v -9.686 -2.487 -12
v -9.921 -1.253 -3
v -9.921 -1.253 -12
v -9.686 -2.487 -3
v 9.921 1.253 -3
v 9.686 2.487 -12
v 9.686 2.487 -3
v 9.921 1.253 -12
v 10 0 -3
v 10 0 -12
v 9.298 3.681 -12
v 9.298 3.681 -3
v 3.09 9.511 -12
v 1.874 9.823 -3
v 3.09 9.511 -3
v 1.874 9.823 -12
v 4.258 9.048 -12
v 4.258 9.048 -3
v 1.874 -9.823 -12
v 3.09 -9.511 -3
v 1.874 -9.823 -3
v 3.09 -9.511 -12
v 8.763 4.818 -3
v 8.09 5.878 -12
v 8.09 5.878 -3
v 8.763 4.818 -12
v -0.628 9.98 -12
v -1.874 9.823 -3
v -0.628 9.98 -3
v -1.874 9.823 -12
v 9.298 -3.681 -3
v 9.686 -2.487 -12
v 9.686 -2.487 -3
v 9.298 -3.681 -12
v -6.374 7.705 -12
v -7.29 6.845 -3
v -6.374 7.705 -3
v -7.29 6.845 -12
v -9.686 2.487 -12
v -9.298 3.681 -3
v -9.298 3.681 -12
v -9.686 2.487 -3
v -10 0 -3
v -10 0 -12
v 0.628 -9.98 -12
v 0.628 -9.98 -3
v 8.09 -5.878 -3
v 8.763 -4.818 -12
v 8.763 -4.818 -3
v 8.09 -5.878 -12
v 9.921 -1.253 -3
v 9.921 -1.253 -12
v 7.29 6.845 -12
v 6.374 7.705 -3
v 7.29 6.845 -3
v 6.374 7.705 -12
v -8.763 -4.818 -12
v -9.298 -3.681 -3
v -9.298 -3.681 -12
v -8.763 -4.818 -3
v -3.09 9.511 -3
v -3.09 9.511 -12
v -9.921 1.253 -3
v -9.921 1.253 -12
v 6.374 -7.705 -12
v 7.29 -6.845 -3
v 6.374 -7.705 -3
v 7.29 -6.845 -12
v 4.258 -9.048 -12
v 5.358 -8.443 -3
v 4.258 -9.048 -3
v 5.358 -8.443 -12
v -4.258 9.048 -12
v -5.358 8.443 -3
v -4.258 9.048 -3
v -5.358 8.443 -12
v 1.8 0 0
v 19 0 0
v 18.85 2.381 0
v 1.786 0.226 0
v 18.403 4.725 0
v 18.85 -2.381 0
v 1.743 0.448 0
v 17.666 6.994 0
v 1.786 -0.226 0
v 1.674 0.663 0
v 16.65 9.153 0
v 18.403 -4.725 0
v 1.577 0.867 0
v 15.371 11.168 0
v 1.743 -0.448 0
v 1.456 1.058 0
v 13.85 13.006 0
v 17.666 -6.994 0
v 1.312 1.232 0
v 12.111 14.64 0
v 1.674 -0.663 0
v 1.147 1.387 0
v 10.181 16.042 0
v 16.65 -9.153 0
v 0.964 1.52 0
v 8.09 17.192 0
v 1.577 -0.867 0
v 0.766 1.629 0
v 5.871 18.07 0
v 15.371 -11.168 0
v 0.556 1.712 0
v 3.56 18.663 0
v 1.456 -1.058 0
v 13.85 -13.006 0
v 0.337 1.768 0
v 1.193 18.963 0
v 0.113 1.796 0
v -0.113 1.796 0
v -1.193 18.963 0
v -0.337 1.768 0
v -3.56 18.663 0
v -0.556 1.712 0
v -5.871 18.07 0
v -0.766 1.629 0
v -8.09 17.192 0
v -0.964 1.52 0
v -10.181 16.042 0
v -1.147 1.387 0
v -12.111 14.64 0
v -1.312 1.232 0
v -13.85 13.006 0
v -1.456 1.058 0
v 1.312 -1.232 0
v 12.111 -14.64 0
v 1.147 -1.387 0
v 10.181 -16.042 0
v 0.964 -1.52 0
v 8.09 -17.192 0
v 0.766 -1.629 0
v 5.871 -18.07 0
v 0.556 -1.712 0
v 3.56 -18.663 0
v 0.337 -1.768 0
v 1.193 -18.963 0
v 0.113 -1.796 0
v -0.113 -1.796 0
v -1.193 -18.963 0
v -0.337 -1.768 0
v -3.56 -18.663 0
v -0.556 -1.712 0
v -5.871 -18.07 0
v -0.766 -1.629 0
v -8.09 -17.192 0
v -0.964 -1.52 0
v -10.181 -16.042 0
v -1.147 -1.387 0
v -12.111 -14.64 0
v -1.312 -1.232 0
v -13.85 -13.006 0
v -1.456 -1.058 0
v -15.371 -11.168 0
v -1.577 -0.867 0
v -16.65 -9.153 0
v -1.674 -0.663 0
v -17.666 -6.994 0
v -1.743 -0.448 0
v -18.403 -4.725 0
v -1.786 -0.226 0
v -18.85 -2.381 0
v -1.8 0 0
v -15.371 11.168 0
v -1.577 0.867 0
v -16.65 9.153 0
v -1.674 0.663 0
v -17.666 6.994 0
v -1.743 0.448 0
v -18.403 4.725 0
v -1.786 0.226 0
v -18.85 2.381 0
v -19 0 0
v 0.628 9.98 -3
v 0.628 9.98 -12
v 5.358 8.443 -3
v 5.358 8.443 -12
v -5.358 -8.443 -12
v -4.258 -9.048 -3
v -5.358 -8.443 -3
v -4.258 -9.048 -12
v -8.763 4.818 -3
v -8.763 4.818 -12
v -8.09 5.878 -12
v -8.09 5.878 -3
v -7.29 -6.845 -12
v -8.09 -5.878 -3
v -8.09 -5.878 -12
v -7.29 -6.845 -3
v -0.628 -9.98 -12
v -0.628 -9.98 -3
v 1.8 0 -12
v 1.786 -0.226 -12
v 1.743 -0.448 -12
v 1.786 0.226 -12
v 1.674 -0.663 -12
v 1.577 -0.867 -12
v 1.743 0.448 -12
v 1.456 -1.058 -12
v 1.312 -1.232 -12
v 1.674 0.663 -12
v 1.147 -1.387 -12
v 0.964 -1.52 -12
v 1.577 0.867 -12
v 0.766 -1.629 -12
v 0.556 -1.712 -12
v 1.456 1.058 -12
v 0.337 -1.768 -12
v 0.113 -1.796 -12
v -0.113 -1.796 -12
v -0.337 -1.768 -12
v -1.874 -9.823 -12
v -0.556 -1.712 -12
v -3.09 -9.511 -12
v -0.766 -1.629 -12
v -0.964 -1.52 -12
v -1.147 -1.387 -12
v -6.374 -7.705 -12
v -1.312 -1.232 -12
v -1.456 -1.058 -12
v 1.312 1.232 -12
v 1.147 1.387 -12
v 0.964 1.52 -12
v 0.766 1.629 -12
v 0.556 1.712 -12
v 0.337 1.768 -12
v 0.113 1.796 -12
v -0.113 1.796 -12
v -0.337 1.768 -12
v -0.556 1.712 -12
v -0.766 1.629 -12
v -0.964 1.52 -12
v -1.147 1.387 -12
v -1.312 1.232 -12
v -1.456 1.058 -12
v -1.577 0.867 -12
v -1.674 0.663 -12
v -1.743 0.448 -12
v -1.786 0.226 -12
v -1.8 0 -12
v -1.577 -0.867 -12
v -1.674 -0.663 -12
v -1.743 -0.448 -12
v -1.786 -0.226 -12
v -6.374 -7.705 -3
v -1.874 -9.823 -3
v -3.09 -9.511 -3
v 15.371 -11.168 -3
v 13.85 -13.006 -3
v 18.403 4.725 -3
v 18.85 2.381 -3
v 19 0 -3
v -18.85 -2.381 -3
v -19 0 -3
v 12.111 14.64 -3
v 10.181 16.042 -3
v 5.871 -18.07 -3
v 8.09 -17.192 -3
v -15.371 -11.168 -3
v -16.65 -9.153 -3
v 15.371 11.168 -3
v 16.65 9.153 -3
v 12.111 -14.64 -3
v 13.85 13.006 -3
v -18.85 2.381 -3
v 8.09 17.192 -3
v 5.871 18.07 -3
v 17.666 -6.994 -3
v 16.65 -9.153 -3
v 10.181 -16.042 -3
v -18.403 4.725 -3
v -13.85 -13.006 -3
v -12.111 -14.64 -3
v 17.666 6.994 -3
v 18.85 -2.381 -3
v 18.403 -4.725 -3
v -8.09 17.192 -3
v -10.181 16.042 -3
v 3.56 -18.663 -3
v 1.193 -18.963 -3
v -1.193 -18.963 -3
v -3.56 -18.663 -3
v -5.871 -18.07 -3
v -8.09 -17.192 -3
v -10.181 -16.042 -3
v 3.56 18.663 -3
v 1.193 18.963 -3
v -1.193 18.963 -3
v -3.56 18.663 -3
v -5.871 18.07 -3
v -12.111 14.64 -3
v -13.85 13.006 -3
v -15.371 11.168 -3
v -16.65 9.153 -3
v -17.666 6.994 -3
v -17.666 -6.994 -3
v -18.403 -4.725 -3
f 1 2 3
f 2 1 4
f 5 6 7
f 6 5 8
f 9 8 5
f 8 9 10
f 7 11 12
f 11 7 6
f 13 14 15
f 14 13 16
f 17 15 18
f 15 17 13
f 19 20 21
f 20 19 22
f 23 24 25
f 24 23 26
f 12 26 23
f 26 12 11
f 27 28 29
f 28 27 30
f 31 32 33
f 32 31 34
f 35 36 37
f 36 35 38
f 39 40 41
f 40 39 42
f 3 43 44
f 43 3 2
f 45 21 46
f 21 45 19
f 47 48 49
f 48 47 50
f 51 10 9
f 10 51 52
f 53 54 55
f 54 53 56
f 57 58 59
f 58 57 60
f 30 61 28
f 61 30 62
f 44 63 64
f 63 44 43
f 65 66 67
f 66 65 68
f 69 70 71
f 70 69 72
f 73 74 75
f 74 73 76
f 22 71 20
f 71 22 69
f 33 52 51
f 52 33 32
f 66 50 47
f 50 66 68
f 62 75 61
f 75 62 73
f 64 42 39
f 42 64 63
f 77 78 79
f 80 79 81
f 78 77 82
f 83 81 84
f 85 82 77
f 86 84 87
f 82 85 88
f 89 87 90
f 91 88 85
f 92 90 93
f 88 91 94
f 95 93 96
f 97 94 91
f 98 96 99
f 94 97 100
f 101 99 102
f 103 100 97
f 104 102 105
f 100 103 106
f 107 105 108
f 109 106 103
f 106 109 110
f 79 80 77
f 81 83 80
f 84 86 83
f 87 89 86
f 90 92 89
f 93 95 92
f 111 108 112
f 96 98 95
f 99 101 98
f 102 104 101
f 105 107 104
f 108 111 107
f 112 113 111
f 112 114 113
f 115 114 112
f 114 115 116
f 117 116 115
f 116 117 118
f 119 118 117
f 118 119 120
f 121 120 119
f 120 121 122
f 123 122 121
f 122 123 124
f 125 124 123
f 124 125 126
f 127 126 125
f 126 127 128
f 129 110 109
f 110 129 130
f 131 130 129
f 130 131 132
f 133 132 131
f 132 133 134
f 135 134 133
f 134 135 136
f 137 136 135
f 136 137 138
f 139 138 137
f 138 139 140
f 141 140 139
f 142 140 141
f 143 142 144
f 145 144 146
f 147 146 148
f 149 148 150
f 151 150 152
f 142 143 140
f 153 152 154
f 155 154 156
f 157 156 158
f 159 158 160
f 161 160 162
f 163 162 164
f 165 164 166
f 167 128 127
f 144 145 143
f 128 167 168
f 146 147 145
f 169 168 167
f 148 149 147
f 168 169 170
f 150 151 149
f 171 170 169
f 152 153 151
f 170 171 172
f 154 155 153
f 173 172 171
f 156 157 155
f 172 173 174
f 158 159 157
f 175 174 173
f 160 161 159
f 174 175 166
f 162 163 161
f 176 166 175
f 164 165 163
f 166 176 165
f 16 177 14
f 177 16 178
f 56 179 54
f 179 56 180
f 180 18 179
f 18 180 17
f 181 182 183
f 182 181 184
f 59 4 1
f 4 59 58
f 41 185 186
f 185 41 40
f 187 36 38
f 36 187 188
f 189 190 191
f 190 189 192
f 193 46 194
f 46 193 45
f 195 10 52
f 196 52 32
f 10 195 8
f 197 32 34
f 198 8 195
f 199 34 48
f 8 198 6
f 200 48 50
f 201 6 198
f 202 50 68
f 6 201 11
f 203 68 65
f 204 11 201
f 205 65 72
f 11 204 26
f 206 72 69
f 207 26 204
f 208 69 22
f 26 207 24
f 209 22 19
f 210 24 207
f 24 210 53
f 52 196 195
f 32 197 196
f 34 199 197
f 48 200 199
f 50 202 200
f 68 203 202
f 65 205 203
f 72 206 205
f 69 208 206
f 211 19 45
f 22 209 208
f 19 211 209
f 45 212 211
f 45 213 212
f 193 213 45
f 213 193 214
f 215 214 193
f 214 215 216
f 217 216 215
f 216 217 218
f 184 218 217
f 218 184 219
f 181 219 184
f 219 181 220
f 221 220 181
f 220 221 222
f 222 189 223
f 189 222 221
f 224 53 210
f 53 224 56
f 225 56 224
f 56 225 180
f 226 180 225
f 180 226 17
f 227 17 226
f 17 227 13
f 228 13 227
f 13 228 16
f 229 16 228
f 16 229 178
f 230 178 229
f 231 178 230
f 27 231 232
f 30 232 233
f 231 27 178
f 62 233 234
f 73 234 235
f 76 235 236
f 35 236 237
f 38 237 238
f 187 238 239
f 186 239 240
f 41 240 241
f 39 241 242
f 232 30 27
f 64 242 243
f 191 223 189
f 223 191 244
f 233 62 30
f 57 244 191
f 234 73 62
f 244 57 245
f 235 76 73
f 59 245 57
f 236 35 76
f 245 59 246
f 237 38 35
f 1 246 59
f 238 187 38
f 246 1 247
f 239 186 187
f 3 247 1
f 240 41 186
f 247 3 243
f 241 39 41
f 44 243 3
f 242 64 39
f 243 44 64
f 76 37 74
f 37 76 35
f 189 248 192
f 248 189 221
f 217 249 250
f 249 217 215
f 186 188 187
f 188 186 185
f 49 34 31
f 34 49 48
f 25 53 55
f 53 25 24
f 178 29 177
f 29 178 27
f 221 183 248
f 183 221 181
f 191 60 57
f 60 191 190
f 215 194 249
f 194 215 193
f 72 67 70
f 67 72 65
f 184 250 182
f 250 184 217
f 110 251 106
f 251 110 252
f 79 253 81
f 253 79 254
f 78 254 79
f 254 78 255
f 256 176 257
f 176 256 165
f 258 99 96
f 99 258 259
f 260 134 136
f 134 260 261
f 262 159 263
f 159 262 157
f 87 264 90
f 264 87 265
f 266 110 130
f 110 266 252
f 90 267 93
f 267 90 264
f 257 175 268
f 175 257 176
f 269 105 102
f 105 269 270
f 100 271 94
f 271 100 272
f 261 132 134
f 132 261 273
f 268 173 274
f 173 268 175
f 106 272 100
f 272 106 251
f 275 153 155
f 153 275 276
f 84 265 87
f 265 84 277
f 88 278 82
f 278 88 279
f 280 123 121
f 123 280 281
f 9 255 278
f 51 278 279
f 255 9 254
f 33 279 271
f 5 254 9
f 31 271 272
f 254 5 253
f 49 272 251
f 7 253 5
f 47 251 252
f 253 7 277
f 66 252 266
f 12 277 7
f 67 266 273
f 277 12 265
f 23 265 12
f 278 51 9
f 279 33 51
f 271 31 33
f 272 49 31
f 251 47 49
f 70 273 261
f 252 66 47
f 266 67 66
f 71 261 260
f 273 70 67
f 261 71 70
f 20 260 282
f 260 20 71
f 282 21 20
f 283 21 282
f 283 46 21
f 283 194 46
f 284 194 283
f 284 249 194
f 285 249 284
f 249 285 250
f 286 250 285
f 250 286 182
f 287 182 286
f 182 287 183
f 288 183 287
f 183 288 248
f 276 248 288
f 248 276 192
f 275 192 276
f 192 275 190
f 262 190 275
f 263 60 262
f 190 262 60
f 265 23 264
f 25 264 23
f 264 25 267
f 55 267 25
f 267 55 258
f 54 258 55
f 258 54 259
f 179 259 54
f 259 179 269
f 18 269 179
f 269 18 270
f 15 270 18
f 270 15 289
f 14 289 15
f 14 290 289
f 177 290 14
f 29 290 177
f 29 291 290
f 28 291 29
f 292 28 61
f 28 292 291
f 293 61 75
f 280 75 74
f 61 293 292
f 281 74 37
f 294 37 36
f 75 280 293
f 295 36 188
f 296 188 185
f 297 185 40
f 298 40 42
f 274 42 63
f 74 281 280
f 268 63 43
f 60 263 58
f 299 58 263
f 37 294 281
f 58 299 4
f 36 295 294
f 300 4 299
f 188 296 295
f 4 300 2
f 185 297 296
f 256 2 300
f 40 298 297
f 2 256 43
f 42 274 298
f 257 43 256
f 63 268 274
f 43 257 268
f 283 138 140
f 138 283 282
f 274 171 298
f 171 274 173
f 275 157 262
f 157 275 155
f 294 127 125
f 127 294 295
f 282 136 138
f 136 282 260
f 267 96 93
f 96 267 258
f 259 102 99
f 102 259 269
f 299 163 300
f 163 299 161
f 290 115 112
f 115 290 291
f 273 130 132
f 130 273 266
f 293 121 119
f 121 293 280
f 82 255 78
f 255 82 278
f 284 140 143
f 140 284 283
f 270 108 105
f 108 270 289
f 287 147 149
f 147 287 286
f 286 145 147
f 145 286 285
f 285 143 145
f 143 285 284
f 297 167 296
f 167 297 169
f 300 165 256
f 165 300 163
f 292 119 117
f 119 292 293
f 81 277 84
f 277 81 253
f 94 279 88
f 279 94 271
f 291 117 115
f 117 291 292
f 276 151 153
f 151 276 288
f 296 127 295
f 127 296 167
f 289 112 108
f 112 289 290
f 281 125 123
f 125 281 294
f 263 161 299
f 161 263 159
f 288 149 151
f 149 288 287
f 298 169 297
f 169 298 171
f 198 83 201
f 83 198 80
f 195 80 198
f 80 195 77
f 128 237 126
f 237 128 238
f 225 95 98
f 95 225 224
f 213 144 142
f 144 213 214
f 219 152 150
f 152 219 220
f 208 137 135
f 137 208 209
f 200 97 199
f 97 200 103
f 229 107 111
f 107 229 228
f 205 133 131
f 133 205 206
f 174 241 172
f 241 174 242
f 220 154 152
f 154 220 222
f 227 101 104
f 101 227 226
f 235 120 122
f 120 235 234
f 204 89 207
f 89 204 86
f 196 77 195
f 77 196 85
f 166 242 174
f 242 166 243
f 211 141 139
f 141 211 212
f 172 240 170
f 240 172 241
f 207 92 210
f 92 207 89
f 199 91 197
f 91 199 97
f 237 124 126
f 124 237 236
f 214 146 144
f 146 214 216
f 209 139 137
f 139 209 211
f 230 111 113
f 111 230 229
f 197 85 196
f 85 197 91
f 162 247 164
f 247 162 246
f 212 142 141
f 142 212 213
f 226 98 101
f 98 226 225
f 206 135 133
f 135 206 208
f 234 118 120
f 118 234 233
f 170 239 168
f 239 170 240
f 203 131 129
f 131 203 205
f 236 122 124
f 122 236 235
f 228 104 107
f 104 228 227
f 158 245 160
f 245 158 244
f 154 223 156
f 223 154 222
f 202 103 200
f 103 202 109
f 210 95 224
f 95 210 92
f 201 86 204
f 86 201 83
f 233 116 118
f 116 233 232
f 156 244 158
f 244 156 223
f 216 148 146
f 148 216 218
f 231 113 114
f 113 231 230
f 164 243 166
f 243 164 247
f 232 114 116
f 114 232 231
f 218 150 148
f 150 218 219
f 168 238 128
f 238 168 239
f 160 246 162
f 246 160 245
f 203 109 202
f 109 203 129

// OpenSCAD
$fn = 50;


difference() {
	union() {
		translate(v = [0, 0, -12.0000000000]) {
			cylinder(h = 12, r = 10.0000000000);
		}
		translate(v = [0, 0, -3.0000000000]) {
			cylinder(h = 3, r = 19.0000000000);
		}
	}
	union() {
		#translate(v = [0, 0, -12]) {
			cylinder(h = 12, r = 1.8000000000);
		}
	}
}
